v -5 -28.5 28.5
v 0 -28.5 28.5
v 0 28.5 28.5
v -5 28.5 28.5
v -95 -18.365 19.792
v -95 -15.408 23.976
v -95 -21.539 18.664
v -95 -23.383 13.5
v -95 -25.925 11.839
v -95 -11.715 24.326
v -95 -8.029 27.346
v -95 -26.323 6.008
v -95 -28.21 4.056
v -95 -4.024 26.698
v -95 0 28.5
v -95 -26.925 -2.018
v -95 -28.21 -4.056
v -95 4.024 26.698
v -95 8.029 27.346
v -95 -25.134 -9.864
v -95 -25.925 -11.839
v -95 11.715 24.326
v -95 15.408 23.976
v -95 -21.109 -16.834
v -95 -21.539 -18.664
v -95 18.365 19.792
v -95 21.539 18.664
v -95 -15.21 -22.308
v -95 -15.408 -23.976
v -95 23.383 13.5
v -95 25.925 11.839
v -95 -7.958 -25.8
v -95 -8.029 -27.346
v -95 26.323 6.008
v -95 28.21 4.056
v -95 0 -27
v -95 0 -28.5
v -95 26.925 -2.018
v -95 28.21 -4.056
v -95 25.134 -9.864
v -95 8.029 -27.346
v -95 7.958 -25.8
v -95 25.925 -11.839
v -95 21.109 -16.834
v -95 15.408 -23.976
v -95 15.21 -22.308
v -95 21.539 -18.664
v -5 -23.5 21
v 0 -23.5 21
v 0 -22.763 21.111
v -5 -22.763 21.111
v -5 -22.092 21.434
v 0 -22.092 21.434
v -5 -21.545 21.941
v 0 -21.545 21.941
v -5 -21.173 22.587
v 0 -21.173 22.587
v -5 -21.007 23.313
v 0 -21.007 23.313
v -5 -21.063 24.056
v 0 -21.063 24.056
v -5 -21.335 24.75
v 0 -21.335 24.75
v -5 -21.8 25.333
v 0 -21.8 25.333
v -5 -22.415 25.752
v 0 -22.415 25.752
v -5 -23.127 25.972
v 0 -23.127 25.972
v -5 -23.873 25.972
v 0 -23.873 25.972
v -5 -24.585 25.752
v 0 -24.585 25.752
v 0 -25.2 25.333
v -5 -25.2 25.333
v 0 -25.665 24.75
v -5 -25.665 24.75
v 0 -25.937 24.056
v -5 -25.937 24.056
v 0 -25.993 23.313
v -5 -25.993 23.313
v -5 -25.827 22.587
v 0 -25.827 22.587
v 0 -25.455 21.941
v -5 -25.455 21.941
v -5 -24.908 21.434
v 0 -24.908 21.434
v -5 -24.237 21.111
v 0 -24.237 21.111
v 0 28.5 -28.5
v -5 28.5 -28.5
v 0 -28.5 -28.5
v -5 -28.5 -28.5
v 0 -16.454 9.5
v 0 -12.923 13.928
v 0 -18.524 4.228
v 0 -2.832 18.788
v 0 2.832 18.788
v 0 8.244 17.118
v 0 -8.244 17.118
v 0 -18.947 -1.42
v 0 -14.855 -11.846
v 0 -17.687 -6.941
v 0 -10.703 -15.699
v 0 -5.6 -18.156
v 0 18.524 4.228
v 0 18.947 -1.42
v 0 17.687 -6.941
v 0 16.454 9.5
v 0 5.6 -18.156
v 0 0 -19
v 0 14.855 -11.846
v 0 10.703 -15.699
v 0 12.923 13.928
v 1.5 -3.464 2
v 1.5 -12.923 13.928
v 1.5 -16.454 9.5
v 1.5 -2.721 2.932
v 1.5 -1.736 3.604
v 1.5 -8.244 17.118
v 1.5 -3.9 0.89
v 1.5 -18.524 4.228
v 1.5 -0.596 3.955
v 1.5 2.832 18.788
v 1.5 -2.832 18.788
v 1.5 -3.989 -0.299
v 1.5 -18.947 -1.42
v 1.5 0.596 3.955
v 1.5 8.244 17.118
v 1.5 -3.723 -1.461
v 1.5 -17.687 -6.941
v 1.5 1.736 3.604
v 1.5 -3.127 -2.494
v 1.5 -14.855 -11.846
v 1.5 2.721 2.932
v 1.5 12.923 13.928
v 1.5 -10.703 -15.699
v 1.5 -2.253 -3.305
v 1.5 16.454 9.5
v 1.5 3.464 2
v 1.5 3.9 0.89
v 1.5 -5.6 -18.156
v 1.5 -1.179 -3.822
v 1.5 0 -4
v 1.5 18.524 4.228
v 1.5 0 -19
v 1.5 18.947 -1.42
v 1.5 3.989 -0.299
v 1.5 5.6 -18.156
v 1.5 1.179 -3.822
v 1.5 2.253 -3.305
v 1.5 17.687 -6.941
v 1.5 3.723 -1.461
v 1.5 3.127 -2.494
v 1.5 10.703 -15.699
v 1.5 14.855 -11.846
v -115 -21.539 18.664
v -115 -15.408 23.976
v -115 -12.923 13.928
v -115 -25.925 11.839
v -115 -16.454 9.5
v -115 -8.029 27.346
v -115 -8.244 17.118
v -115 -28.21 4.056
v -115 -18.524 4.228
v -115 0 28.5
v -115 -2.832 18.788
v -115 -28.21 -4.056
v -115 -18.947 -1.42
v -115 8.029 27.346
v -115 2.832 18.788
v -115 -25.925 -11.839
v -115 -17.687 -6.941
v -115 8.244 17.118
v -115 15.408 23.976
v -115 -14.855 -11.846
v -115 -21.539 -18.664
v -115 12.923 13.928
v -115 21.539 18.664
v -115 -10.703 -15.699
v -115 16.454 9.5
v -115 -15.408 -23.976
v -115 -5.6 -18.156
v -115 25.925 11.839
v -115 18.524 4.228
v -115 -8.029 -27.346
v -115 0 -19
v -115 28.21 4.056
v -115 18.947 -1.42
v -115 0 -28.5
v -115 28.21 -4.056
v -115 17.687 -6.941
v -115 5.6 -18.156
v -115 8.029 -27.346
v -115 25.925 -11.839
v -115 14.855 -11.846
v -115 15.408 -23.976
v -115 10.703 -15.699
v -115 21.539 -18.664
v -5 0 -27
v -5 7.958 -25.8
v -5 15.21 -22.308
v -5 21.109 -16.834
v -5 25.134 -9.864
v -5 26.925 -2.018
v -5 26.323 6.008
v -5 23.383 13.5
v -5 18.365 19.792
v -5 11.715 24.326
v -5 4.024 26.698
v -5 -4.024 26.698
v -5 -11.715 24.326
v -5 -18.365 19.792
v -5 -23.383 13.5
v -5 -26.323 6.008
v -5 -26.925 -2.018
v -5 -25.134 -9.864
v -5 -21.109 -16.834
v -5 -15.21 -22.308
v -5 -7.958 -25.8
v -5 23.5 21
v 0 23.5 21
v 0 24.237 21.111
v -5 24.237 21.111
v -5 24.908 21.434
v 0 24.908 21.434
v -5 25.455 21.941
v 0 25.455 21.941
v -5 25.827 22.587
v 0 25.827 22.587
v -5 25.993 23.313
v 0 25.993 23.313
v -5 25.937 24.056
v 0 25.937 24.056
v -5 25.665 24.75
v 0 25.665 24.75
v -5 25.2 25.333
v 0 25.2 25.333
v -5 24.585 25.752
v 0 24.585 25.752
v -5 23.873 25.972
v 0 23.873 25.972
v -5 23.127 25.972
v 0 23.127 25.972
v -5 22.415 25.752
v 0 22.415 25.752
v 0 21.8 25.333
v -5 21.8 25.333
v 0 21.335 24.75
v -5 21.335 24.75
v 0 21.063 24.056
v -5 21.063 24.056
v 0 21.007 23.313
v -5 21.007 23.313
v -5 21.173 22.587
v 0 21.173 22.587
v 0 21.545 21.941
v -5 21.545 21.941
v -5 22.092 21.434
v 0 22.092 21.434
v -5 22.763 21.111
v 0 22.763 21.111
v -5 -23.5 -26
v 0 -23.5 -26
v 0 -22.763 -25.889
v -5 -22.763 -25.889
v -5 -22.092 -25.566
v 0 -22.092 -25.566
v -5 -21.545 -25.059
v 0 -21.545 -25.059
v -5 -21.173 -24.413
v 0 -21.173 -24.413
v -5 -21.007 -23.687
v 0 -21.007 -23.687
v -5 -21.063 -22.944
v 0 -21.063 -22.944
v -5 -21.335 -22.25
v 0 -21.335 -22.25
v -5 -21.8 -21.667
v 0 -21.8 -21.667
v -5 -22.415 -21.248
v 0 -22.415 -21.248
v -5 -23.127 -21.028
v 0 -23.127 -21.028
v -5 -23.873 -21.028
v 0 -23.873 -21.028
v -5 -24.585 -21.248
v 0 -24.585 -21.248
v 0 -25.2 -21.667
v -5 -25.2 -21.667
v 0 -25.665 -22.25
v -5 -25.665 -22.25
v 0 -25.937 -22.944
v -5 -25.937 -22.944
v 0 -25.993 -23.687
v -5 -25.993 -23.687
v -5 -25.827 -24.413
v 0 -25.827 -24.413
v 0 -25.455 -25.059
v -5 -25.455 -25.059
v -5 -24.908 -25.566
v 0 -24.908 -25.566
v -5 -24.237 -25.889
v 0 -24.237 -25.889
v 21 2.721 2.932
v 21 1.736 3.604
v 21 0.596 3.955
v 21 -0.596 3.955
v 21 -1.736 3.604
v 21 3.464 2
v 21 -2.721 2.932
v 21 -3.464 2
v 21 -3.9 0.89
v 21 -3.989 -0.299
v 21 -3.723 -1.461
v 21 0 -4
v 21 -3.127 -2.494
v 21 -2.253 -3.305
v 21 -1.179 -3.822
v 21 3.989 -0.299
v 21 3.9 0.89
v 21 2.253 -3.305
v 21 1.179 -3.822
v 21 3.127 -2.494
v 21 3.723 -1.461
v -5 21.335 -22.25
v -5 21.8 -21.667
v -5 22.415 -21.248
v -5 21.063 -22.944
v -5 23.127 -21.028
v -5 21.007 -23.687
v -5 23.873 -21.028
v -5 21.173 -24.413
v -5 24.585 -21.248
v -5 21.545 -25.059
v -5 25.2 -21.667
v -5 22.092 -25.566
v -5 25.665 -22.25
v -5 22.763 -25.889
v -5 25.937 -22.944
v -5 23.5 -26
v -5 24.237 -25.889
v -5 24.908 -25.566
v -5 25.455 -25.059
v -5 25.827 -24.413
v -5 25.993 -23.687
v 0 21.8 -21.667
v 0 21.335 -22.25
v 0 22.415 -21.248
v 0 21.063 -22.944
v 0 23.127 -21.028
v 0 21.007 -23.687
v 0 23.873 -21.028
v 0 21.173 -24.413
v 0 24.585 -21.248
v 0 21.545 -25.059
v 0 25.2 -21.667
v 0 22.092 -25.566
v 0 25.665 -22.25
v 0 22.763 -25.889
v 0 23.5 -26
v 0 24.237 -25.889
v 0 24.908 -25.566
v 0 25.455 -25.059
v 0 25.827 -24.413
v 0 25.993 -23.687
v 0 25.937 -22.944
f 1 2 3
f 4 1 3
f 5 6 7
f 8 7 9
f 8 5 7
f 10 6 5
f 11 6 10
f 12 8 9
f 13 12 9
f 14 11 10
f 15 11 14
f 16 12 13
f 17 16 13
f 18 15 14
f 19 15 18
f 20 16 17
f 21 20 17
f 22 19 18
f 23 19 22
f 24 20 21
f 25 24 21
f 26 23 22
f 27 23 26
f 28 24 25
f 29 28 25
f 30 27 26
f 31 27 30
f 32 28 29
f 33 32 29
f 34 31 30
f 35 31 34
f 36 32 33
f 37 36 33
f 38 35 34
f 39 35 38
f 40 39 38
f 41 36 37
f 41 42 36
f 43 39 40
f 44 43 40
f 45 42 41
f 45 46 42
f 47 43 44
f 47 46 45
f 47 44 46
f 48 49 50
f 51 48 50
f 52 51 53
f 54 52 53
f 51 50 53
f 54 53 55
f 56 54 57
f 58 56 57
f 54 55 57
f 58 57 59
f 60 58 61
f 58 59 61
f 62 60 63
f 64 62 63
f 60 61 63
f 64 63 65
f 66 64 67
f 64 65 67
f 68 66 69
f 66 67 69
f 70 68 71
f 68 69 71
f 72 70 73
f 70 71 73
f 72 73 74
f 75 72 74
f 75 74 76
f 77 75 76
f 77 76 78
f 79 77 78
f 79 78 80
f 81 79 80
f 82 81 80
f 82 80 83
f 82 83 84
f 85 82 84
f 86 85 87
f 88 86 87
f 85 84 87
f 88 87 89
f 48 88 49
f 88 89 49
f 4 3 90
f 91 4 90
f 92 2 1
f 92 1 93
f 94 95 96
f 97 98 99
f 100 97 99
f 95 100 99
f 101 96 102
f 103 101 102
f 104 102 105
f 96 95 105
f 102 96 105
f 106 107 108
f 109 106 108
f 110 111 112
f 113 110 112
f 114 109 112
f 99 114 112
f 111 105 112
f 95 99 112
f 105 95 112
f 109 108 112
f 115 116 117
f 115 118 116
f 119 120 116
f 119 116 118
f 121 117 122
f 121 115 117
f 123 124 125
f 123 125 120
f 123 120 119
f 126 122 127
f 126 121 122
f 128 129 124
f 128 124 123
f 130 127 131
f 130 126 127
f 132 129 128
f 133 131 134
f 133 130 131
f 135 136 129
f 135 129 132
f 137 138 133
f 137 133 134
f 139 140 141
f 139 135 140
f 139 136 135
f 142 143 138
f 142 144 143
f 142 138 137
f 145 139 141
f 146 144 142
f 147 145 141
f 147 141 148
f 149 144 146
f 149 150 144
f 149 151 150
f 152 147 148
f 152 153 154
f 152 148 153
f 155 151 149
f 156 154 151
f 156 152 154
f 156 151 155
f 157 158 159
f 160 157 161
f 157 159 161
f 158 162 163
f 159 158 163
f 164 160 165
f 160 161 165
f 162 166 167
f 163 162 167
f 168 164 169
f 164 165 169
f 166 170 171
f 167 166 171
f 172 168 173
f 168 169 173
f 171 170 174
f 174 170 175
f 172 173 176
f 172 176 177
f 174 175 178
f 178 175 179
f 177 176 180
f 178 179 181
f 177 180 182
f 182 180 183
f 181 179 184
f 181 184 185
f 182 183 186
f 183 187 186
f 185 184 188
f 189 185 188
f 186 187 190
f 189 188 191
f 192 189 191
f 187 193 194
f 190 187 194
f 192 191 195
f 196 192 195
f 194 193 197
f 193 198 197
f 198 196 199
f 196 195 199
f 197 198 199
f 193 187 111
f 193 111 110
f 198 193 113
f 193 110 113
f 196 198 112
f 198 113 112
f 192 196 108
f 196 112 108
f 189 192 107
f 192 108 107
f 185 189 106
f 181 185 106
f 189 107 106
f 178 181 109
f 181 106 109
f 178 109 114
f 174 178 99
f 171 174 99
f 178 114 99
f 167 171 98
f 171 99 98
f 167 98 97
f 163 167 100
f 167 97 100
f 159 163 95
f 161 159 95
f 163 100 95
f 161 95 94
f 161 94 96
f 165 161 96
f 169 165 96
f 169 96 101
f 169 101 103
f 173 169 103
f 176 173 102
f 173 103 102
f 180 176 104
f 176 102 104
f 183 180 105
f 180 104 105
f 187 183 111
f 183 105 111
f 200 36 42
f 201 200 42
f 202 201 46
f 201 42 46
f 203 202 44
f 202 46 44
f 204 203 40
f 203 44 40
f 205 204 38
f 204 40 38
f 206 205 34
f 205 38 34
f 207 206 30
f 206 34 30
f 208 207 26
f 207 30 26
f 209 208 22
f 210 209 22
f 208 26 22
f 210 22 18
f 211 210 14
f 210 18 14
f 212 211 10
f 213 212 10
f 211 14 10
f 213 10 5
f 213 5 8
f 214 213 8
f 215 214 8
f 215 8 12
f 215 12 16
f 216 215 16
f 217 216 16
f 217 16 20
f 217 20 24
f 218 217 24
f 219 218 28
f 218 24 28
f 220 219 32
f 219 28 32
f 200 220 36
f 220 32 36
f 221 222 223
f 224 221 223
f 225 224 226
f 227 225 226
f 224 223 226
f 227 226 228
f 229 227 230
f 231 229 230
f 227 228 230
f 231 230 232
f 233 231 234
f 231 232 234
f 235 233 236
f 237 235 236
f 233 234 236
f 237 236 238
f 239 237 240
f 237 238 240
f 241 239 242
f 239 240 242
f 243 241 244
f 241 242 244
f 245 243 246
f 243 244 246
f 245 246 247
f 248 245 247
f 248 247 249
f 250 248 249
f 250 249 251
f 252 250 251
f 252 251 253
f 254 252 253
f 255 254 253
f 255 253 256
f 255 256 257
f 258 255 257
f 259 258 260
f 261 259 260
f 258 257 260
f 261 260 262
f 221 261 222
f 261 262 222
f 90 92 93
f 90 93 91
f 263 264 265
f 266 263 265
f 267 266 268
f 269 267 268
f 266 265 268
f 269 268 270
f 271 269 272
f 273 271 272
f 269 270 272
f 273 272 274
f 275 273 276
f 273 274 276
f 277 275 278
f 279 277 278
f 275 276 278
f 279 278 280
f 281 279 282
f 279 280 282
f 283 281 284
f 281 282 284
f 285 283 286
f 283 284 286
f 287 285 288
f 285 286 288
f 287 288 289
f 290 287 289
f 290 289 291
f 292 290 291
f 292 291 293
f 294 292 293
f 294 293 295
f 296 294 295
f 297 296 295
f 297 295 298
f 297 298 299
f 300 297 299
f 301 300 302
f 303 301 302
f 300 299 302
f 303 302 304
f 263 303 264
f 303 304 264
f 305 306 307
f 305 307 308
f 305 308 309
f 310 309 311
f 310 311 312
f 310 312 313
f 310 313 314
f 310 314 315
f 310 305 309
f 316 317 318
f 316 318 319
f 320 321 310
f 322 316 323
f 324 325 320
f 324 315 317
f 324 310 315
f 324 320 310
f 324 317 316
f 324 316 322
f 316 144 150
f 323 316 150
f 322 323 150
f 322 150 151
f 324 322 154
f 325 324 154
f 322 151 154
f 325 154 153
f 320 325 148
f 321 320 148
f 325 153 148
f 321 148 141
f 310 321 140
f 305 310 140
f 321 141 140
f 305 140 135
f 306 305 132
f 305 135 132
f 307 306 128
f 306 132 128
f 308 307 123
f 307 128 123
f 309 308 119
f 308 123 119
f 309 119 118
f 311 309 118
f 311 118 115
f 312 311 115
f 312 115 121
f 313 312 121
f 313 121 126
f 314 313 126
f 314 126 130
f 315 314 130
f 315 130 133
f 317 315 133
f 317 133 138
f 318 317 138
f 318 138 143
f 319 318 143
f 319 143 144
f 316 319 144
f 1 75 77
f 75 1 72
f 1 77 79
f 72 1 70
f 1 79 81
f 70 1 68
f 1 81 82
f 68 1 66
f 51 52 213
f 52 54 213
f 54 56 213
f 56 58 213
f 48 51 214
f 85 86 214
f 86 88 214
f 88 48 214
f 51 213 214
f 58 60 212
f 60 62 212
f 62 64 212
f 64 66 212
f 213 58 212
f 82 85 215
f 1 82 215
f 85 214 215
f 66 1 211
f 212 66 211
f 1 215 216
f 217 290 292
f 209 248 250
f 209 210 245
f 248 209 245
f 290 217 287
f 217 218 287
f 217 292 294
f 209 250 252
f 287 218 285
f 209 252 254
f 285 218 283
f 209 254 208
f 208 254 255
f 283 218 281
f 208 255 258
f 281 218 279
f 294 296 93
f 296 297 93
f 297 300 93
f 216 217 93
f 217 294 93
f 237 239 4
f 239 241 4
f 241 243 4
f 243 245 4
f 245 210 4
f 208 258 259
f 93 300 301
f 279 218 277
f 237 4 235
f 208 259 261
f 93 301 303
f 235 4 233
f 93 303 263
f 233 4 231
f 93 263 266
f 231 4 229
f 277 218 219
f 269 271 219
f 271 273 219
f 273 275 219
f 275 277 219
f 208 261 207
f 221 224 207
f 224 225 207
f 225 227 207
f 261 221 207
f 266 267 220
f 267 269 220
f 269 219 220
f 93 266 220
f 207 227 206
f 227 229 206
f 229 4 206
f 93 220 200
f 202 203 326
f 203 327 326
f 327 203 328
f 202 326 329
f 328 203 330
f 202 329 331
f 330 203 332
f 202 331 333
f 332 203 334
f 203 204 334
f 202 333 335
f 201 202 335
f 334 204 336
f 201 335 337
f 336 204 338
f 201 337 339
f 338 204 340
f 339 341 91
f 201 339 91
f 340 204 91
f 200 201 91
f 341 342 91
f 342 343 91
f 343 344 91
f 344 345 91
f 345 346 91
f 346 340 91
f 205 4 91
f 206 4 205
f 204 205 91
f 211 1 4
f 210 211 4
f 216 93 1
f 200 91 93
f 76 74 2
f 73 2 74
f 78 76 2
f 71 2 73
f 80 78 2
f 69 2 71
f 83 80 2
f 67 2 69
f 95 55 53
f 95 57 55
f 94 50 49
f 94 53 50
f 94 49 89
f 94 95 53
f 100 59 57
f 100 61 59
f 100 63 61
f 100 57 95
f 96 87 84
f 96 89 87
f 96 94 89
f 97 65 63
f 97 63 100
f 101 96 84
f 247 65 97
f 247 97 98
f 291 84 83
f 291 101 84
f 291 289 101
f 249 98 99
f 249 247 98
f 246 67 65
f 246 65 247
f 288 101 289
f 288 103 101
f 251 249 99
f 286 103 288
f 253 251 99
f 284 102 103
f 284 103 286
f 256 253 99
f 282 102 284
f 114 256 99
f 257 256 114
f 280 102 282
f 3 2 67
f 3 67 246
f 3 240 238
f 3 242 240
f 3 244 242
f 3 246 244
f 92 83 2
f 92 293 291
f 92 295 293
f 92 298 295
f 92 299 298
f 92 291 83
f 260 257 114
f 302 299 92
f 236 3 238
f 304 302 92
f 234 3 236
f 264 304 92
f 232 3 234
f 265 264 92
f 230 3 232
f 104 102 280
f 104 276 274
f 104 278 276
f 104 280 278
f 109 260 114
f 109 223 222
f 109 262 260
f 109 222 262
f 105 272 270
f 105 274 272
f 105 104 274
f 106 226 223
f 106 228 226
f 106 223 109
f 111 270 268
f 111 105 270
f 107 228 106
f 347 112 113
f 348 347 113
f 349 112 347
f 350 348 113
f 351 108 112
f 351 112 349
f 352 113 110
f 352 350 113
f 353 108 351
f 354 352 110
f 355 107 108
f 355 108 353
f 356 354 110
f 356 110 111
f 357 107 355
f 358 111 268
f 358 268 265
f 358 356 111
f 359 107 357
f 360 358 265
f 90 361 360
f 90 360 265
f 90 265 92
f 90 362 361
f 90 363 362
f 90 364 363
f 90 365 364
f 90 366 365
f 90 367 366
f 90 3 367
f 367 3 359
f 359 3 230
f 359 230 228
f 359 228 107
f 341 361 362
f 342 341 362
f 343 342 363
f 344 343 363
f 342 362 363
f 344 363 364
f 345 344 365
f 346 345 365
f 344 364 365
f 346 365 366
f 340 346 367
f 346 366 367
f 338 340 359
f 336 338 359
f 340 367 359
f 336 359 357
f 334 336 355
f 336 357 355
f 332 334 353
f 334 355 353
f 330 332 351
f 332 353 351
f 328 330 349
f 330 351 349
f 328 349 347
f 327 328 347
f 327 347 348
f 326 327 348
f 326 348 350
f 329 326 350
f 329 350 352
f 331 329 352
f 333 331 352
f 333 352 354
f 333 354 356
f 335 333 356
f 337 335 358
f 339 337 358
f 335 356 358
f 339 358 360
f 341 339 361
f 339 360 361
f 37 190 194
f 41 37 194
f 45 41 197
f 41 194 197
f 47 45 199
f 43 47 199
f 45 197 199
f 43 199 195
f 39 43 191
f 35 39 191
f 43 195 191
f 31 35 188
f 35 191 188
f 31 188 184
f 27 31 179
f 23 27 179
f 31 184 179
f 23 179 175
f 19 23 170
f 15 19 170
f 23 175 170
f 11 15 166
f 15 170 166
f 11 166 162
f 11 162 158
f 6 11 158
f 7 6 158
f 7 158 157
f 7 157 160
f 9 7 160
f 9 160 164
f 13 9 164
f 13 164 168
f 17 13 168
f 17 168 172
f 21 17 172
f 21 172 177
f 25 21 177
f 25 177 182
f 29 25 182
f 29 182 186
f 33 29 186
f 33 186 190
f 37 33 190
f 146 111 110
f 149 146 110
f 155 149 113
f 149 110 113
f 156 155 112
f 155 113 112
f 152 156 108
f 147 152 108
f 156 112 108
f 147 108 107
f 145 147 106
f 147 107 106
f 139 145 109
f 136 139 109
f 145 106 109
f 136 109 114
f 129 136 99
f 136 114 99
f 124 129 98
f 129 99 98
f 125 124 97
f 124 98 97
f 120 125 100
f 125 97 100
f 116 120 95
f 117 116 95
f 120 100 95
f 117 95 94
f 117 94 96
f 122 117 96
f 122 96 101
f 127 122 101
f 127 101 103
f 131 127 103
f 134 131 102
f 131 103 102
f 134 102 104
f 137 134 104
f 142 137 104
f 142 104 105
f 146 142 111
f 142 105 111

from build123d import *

# Parameters (mm, degrees)
SKETCH_1_R          = 4
EXTRUDE_1_DEPTH     = 21
SKETCH_1_3_R        = 19
SKETCH_1_3_R_2      = 4
EXTRUDE_2_DEPTH     = 1.5
SKETCH_1_4_W        = 57
SKETCH_1_4_H        = 57
SKETCH_1_4_R        = 19
EXTRUDE_3_DEPTH     = 115
SKETCH_9_OUTSIDE_W  = 90.618
SKETCH_9_OUTSIDE_H  = 90.618
SKETCH_9_OUTSIDE_R  = 28.5
CUT_EXTRUDE_1_DEPTH = 20
SKETCH_11_OUTSIDE_W = 90.618
SKETCH_11_OUTSIDE_H = 90.618
SKETCH_11_OUTSIDE_R = 27
CUT_EXTRUDE_2_DEPTH = 90
SKETCH_16_R         = 2.5
CUT_EXTRUDE_3_DEPTH = 5


with BuildPart() as part:
    # 草图1 → 凸台-拉伸1 (new body)
    with BuildSketch(Plane(origin=(0, 0, 0), x_dir=(0, 0, -1), z_dir=(1, 0, 0))):
        Circle(SKETCH_1_R)
    extrude(amount=EXTRUDE_1_DEPTH)

    # 草图1<3> → 凸台-拉伸2 (add)
    with BuildSketch(Plane(origin=(0, 0, 0), x_dir=(0, 0, -1), z_dir=(1, 0, 0))):
        Circle(SKETCH_1_3_R)
        Circle(SKETCH_1_3_R_2, mode=Mode.SUBTRACT)
    extrude(amount=EXTRUDE_2_DEPTH)


with BuildPart() as body_2:
    # 草图1<4> → 凸台-拉伸3 (new body)
    with BuildSketch(Plane(origin=(0, 0, 0), x_dir=(0, 0, -1), z_dir=(1, 0, 0))):
        Rectangle(SKETCH_1_4_W, SKETCH_1_4_H)
        Circle(SKETCH_1_4_R, mode=Mode.SUBTRACT)
    extrude(amount=-EXTRUDE_3_DEPTH)

    # 草图9 outside → 切除-拉伸1 (cut)
    with BuildSketch(Plane(origin=(-115, 0, 0), x_dir=(0, 0, -1), z_dir=(1, 0, 0))):
        Rectangle(SKETCH_9_OUTSIDE_W, SKETCH_9_OUTSIDE_H)
        Circle(SKETCH_9_OUTSIDE_R, mode=Mode.SUBTRACT)
    extrude(amount=CUT_EXTRUDE_1_DEPTH, mode=Mode.SUBTRACT)

    # 草图11 outside → 切除-拉伸2 (cut)
    with BuildSketch(Plane(origin=(-95, 0, 0), x_dir=(0, 0, -1), z_dir=(1, 0, 0))):
        Rectangle(SKETCH_11_OUTSIDE_W, SKETCH_11_OUTSIDE_H)
        Circle(SKETCH_11_OUTSIDE_R, mode=Mode.SUBTRACT)
    extrude(amount=CUT_EXTRUDE_2_DEPTH, mode=Mode.SUBTRACT)

    # 草图16 → 切除-拉伸3 (cut)
    with BuildSketch(Plane(origin=(0, 0, 0), x_dir=(0, 0, -1), z_dir=(1, 0, 0))):
        with Locations((-23.5, 23.5)):
            Circle(SKETCH_16_R)
        with Locations((23.5, 23.5)):
            Circle(SKETCH_16_R)
        with Locations((23.5, -23.5)):
            Circle(SKETCH_16_R)
        with Locations((-23.5, -23.5)):
            Circle(SKETCH_16_R)
    extrude(amount=-CUT_EXTRUDE_3_DEPTH, mode=Mode.SUBTRACT)


solid = Compound([part.part, body_2.part])
